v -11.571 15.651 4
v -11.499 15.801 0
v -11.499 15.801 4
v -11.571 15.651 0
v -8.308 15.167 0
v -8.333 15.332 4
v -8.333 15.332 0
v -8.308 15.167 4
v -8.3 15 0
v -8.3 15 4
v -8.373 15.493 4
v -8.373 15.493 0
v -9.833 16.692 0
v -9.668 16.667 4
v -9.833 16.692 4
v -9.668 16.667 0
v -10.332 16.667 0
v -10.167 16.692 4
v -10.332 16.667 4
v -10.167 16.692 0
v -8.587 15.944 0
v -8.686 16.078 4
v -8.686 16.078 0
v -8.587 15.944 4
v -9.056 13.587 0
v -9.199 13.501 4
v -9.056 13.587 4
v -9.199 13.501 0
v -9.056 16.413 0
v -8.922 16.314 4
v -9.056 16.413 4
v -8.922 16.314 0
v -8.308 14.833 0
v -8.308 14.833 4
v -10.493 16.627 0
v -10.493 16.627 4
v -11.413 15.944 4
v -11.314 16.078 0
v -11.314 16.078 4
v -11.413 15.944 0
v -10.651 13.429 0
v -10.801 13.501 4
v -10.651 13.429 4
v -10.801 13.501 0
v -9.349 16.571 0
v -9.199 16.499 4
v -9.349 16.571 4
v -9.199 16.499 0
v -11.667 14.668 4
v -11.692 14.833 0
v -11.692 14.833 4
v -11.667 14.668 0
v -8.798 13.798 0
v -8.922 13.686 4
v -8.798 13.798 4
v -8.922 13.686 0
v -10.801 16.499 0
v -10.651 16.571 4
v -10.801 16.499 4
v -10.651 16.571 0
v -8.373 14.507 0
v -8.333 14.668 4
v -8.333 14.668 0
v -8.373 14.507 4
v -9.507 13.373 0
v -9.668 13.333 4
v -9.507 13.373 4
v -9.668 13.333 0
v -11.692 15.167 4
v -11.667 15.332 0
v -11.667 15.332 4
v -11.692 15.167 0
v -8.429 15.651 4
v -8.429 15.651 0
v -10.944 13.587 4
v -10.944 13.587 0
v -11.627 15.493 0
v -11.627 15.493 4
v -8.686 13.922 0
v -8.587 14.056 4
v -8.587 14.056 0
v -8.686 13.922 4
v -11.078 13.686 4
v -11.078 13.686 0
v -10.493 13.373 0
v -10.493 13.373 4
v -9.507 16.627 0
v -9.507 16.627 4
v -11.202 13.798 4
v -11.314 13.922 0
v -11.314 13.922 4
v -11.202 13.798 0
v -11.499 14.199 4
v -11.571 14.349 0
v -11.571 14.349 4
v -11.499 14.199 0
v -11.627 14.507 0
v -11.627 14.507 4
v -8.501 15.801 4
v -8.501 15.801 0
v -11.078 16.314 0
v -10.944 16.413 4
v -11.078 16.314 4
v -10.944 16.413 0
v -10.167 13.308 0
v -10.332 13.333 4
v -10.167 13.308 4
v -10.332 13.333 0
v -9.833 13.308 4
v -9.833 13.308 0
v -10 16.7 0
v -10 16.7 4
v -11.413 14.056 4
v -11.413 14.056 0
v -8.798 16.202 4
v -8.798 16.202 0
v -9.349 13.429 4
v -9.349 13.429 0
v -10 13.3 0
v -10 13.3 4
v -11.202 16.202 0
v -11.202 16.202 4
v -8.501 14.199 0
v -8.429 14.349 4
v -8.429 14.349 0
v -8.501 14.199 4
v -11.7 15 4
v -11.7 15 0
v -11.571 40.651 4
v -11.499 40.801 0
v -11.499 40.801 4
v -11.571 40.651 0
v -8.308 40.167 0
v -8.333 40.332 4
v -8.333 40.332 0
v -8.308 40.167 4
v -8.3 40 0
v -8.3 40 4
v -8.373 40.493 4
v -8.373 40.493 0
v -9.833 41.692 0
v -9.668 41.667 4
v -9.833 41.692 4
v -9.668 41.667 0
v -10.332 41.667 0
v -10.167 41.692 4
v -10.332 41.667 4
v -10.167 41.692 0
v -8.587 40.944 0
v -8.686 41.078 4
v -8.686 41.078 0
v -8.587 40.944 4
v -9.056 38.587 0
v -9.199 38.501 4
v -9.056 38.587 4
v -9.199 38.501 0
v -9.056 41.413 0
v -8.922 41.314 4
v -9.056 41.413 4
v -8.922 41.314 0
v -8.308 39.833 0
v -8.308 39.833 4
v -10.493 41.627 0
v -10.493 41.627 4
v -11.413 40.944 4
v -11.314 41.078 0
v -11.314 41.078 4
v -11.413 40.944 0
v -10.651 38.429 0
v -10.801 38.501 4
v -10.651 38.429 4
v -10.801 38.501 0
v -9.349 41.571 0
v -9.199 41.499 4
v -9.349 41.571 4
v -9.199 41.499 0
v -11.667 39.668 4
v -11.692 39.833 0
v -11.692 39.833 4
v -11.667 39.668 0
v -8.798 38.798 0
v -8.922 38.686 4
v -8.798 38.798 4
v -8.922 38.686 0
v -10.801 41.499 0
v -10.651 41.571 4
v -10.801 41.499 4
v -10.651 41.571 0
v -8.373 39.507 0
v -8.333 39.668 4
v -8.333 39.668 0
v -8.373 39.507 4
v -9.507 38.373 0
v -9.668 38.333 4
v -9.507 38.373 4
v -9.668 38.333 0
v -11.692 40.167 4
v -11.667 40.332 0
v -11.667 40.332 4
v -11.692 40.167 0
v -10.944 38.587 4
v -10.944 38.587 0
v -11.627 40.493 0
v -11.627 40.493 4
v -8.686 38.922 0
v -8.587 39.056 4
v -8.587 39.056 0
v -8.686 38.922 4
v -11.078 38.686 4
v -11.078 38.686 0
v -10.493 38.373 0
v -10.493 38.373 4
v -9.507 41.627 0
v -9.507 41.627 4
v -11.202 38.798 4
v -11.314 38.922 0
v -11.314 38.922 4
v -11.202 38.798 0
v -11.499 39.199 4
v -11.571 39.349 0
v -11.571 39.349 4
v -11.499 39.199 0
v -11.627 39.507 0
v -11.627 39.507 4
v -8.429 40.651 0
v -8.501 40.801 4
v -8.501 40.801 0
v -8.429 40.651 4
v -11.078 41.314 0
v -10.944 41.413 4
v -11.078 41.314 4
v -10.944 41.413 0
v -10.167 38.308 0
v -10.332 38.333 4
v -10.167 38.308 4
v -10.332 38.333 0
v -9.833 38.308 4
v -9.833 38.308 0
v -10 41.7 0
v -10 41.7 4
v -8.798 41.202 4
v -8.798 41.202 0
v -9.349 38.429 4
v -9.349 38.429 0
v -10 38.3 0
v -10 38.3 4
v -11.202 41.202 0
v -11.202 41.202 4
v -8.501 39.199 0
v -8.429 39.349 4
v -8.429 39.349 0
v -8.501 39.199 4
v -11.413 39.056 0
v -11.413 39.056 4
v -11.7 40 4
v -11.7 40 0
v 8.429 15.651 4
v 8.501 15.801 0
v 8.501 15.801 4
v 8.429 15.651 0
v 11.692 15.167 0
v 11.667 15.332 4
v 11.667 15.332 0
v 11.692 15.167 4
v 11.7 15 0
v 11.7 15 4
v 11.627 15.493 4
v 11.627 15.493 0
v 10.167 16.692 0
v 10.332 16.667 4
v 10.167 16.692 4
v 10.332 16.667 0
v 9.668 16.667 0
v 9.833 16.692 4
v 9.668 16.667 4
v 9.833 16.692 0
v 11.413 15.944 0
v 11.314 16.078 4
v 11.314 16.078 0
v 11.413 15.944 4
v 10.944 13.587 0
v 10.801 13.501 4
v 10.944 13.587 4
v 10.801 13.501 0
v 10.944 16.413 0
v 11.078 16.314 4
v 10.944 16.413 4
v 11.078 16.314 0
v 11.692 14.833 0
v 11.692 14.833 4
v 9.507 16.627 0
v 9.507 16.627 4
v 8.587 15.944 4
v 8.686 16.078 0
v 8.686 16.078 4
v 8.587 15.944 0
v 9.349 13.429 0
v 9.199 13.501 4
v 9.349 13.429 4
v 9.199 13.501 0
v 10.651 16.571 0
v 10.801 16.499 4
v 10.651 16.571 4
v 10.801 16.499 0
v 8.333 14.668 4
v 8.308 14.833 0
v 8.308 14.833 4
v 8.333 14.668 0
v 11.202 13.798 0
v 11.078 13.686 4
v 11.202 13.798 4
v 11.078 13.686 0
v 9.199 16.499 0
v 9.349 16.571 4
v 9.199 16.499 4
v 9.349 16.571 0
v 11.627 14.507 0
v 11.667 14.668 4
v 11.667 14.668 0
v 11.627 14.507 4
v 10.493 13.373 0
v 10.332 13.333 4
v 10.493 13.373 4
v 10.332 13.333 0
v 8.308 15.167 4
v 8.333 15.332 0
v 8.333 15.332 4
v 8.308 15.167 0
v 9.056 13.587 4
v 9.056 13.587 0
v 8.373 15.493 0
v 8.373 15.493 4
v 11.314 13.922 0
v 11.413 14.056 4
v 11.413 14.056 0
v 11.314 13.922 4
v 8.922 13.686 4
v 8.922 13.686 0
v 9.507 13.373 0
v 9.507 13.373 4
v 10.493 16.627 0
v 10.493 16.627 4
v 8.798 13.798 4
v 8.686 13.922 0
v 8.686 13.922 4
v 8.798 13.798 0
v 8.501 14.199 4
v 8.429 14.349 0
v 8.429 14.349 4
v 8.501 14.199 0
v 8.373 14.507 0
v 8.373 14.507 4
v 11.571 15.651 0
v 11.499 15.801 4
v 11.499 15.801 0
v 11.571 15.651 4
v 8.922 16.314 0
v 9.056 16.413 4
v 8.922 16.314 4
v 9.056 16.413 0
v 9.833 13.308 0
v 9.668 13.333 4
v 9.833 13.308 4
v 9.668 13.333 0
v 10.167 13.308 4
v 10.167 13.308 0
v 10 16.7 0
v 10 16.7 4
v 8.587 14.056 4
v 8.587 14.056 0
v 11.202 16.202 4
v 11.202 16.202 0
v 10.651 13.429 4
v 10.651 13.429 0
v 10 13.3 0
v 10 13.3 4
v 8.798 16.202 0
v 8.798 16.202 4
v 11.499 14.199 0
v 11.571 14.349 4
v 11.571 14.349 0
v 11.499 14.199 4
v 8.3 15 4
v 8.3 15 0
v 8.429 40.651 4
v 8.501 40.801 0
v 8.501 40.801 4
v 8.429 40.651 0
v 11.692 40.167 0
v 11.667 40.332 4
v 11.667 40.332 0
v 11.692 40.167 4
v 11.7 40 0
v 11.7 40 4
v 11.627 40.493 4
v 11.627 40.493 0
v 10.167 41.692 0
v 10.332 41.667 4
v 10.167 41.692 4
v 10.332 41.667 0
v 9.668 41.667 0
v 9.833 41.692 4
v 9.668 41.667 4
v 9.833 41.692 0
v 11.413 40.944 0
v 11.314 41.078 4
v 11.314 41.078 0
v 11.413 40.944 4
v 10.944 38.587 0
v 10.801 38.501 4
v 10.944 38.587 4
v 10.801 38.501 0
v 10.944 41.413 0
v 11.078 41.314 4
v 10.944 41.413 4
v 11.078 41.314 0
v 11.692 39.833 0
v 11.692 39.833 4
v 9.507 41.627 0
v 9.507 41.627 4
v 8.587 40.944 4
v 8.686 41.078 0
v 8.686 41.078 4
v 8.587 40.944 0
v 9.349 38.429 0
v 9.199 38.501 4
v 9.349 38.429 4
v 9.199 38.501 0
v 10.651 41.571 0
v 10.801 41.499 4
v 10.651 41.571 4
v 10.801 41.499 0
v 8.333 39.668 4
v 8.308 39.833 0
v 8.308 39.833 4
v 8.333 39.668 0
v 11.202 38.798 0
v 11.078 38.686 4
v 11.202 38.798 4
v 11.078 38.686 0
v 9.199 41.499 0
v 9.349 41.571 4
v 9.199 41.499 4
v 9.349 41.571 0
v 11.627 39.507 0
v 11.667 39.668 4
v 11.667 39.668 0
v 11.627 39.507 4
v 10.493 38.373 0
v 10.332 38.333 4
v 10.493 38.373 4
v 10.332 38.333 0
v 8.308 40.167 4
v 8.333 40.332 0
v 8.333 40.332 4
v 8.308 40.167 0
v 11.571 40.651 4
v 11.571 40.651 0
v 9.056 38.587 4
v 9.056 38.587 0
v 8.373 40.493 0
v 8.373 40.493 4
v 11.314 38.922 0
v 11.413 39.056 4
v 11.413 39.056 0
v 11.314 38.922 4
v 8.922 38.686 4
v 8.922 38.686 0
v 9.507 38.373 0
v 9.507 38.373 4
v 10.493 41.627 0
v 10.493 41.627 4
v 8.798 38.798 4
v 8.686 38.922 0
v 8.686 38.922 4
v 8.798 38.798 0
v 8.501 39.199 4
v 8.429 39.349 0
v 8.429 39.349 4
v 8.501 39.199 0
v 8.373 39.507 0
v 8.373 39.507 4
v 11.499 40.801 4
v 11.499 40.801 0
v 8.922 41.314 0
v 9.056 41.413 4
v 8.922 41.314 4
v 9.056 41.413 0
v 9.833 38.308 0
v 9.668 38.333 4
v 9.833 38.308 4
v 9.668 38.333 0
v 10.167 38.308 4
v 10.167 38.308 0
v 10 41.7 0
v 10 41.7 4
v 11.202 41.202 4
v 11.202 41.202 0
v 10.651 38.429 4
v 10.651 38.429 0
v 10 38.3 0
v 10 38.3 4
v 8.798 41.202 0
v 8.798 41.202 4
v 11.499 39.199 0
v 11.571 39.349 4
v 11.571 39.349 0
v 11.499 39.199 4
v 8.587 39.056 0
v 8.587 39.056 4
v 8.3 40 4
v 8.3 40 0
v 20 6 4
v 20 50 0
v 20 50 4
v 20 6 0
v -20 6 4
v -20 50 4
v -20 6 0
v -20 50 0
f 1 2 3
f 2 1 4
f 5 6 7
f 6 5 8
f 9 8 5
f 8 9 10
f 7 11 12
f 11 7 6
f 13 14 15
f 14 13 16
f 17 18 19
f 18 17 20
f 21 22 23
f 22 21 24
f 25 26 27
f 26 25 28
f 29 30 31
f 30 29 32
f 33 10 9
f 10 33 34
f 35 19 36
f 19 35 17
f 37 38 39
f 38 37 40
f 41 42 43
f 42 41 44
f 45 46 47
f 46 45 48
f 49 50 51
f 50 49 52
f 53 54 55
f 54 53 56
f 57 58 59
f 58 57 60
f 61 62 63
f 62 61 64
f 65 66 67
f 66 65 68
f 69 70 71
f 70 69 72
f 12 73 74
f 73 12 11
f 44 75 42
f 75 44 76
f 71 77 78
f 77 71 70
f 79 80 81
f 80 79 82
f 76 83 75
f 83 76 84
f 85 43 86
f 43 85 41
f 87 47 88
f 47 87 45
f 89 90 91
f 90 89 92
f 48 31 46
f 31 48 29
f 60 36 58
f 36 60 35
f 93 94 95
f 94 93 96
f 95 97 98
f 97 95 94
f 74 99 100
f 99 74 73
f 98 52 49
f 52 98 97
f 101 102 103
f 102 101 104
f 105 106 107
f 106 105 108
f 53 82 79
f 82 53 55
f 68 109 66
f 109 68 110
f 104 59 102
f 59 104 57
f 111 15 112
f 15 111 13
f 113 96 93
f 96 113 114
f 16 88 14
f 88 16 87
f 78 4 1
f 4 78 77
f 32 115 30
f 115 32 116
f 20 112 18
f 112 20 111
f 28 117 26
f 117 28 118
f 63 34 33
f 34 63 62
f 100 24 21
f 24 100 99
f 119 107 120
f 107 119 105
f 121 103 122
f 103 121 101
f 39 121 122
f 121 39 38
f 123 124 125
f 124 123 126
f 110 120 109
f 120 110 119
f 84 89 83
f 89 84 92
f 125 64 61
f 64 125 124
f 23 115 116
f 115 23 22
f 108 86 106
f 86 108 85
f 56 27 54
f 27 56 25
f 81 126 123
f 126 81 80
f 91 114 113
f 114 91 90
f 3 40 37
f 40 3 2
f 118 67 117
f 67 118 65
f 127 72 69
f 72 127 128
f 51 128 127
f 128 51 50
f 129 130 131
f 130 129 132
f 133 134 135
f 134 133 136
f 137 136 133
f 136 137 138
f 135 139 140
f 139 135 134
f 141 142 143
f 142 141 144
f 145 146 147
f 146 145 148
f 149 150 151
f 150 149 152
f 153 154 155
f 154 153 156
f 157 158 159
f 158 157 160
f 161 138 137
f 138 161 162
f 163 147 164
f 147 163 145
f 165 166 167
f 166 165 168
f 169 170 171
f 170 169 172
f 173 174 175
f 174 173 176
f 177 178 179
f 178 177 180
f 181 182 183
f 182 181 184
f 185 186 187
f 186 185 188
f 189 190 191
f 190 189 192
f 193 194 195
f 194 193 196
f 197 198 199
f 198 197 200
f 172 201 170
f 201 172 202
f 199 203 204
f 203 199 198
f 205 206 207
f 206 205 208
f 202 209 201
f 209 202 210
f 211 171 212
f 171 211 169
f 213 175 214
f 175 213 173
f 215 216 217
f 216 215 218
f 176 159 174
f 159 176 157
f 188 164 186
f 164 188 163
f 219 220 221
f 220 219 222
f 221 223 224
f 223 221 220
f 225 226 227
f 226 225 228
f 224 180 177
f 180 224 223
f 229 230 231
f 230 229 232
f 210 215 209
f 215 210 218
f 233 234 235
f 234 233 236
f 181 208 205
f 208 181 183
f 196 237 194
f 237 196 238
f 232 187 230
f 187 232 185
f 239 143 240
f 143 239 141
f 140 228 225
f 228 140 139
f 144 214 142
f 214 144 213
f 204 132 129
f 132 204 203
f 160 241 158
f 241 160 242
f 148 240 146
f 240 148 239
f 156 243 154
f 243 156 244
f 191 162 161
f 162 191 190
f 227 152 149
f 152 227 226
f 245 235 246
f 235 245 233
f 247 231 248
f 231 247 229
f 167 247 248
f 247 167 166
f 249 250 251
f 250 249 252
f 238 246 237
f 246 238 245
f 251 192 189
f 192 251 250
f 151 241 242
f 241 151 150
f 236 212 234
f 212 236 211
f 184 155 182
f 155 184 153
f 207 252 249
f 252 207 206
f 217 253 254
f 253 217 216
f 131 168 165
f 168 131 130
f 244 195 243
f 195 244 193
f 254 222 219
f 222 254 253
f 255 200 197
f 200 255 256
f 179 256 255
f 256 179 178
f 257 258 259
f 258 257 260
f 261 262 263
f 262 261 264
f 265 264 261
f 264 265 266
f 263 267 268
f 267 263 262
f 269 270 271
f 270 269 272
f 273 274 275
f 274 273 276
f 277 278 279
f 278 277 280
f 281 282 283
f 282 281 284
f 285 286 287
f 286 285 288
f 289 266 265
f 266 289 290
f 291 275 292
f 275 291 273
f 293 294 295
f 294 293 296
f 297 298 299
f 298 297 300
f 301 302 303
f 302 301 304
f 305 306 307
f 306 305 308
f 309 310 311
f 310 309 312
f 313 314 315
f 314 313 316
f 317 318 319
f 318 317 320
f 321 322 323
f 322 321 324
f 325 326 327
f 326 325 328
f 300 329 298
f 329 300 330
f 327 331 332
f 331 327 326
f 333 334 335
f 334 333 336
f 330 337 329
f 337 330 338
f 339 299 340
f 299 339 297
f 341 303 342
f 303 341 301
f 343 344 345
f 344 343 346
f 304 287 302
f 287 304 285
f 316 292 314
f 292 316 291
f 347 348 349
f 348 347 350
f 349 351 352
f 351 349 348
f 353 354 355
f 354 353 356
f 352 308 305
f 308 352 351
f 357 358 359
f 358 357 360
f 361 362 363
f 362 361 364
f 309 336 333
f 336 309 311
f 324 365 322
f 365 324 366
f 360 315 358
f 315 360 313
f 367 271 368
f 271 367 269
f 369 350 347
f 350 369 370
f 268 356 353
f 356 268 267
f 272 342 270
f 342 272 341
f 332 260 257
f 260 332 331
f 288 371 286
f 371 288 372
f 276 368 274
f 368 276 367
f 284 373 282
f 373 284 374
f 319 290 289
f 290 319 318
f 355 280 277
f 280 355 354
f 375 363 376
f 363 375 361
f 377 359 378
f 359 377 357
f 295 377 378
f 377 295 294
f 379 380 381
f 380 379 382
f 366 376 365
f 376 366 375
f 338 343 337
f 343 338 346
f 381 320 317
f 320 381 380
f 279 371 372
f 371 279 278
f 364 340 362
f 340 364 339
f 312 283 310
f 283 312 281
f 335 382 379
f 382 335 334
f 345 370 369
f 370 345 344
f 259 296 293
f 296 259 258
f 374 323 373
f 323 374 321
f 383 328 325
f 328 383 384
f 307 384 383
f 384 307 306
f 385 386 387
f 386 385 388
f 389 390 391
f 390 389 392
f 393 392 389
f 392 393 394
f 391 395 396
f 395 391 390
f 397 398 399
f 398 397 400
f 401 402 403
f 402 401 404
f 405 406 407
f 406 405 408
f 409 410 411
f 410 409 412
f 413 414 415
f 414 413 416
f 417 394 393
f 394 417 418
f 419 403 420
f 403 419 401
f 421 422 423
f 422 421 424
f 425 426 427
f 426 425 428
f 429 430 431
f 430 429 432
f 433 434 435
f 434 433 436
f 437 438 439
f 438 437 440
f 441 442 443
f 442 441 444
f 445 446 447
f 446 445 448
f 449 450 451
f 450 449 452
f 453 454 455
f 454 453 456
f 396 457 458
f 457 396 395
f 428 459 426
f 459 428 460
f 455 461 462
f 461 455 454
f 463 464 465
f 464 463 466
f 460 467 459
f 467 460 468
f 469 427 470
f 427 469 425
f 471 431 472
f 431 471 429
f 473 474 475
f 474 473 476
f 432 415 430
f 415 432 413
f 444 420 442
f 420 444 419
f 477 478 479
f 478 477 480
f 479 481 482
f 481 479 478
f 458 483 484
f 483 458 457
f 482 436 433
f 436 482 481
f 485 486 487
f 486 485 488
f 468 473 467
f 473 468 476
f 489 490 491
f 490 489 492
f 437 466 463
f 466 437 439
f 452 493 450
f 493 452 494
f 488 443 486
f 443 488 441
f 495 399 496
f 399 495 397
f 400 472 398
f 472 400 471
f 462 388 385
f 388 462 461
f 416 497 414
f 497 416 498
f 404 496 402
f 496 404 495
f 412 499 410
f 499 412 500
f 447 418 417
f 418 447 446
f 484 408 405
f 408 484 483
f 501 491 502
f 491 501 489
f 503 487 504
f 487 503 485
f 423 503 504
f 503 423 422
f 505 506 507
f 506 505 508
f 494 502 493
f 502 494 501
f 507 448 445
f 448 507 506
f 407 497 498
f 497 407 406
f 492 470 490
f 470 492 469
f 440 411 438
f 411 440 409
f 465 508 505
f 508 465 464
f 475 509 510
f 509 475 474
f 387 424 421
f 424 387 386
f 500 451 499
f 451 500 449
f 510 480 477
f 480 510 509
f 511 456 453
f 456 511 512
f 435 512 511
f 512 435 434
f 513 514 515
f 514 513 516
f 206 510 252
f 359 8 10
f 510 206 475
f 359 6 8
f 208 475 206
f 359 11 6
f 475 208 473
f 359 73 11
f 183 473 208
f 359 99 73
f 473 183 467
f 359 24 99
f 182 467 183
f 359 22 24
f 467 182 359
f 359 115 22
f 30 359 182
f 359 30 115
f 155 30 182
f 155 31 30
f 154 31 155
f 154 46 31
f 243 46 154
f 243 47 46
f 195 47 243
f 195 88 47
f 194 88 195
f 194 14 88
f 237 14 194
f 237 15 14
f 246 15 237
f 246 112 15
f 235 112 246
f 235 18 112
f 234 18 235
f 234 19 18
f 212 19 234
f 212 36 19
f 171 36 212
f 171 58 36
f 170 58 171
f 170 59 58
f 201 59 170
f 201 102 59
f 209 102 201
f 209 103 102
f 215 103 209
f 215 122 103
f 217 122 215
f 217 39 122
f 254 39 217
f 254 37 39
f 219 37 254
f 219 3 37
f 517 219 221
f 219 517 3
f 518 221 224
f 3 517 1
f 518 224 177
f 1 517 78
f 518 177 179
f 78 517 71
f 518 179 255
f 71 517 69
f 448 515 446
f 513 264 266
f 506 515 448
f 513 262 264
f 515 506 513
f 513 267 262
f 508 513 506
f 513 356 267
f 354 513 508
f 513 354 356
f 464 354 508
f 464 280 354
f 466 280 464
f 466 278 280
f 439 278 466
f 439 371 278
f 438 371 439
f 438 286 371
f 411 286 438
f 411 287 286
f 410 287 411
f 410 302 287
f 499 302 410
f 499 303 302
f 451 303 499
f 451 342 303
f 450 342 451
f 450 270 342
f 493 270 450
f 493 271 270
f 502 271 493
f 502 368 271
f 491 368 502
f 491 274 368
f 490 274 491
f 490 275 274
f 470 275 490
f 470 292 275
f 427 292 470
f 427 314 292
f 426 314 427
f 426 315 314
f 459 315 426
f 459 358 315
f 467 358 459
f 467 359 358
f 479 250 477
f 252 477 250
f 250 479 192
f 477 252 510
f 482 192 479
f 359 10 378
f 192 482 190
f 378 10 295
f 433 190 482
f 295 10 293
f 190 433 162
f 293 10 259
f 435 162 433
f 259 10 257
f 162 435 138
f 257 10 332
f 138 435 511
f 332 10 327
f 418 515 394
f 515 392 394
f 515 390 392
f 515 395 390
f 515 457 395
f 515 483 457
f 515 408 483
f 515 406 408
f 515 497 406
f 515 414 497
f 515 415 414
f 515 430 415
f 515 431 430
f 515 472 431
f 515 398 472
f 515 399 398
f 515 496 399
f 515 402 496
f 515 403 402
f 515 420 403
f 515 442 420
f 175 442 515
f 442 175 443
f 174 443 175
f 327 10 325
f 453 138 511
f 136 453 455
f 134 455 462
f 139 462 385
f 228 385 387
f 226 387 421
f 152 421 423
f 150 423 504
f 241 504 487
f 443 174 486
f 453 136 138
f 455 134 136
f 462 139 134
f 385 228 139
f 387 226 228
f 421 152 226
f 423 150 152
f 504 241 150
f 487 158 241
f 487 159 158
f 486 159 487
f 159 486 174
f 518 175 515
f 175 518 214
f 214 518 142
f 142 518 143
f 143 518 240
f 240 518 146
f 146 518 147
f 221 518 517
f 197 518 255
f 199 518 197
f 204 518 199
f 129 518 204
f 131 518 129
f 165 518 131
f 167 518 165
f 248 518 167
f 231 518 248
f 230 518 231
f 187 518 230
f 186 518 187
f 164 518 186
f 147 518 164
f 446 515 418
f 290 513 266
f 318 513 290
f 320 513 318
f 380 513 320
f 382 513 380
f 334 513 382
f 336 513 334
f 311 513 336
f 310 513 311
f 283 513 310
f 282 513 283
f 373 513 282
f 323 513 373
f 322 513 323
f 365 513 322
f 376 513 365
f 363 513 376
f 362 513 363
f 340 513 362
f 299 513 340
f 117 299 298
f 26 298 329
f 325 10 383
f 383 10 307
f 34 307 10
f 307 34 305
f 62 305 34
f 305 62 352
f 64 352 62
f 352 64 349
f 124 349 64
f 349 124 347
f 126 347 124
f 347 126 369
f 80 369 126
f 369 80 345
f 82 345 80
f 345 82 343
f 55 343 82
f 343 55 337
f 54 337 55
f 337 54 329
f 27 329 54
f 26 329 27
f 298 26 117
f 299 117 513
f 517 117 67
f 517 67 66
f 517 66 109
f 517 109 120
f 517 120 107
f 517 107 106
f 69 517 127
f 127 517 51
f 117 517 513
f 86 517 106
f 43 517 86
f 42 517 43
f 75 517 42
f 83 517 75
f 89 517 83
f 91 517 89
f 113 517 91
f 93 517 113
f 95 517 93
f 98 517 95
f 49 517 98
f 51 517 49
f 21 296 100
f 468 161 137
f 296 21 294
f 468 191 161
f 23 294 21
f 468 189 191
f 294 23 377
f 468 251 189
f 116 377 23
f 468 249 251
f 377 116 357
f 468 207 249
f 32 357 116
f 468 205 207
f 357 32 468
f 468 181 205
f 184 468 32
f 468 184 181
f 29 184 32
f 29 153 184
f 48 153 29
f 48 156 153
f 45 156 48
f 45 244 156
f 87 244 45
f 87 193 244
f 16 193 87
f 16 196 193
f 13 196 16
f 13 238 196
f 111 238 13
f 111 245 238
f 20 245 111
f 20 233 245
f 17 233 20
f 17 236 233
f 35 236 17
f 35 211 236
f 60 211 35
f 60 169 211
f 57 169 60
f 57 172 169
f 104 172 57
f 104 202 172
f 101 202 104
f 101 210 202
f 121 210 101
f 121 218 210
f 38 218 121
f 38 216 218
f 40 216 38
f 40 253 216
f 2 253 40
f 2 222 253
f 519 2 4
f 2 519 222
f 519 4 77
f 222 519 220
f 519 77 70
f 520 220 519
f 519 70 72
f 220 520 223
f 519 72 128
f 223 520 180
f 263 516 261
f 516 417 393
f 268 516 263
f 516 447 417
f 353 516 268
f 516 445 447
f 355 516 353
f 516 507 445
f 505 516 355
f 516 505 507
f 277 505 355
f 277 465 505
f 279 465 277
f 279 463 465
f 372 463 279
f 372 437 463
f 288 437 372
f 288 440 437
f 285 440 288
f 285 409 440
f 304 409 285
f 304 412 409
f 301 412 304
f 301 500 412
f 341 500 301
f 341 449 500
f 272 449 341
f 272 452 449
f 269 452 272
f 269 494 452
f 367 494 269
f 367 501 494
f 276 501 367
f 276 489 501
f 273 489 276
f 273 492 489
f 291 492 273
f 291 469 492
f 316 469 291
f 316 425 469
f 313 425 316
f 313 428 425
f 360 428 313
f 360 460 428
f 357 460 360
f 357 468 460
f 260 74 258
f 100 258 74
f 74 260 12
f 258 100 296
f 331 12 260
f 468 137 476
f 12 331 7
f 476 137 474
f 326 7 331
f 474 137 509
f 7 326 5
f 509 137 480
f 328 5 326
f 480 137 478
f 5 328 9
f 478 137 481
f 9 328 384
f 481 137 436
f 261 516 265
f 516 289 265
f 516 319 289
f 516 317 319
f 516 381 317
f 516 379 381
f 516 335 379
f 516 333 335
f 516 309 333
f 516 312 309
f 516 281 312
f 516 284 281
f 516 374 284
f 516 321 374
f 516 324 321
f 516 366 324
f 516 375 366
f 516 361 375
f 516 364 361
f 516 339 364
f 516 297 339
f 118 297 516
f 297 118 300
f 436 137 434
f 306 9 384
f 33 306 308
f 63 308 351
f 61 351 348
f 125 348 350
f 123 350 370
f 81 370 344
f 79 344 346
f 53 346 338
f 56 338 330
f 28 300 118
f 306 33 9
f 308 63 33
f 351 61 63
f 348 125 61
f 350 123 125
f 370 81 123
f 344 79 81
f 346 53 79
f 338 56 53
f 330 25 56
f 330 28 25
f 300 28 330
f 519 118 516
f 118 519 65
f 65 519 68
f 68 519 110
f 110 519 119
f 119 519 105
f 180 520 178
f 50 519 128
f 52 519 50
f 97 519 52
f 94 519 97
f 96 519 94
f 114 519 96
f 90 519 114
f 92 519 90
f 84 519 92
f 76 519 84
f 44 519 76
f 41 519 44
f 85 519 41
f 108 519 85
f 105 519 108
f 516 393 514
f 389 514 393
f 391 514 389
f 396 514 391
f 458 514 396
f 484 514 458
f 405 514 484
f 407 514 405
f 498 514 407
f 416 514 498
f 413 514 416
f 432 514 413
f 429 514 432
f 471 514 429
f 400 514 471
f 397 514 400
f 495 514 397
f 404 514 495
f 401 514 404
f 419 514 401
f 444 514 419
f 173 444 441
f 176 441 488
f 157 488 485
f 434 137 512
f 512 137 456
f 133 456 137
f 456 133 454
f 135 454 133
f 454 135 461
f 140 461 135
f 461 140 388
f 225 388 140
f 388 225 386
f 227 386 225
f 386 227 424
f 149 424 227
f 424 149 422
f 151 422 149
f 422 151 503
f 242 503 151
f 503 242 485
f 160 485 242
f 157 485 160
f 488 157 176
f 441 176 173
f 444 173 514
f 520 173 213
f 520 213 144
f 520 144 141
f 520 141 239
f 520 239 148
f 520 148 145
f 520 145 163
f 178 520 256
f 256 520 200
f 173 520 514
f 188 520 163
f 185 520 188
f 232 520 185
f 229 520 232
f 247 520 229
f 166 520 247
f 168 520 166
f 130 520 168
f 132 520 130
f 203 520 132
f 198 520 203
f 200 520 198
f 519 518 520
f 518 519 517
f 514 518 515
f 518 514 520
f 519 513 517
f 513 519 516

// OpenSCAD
// file: common.scad
// Shared parameters for the openprint-build printable parts.
//
// These are NOT Open Tools' files (unpublished as of Oct 2026). They are
// original, parametric parts built around standard off-the-shelf components.
// Values marked VERIFY are best estimates: measure your part and edit here.
//
// Coordinate frame used by the axis parts:
//   X = carriage travel (along the guide rods)
//   Y = front (+) / back (-)
//   Z = up
// Lower rod axis at y=0,z=0; upper rod at y=0,z=rod_spacing.

$fn = 64;

clr        = 0.3;    // general fit clearance (Prusa CORE One, 0.4 nozzle)

// Guide rods + linear bearings
rod_d       = 8;     // steel guide rod
rod_spacing = 30;    // vertical distance between the two rods
lm_d        = 15;    // LM8UU outer diameter
lm_l        = 24;    // LM8UU length
lm_fit      = 0.15;  // press fit allowance on LM8UU bore

// GT2 belt drive
belt_w      = 6;     // GT2 6 mm belt
belt_t      = 1.4;   // belt thickness incl. teeth
belt_pitch  = 2;
pulley_pr   = 6.37;  // pitch radius of a GT2 20T pulley / idler
belt_y      = -18;   // belt centre plane (behind the rods)
belt_z      = rod_spacing / 2;   // pulley axis height

// NEMA17
nema_w      = 42.3;
nema_holes  = 31;    // hole spacing
nema_boss   = 22.5;  // centring boss clearance
m3          = 3.4;   // M3 clearance
m3_tap      = 2.8;   // M3 self-tap into plastic
m5          = 5.3;
m5_tap      = 4.3;
m4          = 4.4;

// HP 63 / 302 / 803 cartridge body (same shell for black + tri-colour)
// VERIFY: measure with calipers, or print cart_fit_gauge.stl first.
cart_w      = 19.0;  // along X (thin side)
cart_d      = 36.5;  // along Y (front-back, contact pad on the back face)
cart_fit    = 0.6;   // total clearance per dimension

// Teardrop: horizontal hole that prints without supports.
// Axis along X; point faces +Z.
module teardrop_x(d, l) {
    // rotate([0,90,0]) maps 2D -X to 3D +Z, so the point goes at 180°.
    rotate([0, 90, 0])
    linear_extrude(height = l, center = true)
        union() {
            circle(d = d);
            rotate(135) square(d / 2);  // 45° roof
        }
}

// Same, axis along Y.
module teardrop_y(d, l) {
    // rotate([90,0,0]) maps 2D +Y to 3D +Z.
    rotate([90, 0, 0])
    linear_extrude(height = l, center = true)
        union() {
            circle(d = d);
            rotate(45) square(d / 2);
        }
}

// ---------------------------------------------------------------------------
// Machine layout (frame coordinates). Origin: inner face of the left end wall,
// back face of the tray, bottom of the base. X right, Y toward the front, Z up.
// The axis parts above are modelled around their own rod; place them with
// rod_y / rod_z below.

L        = 525;      // inner length between end walls (outer = L + 2*wall)
wall     = 6;        // end wall / tray wall thickness
base_t   = 4;        // tray floor
depth    = 130;      // tray depth (Y)
height   = 105;      // tray height (Z), excluding roll arms

rod_y    = 70;       // both rods in one vertical plane
rod_z    = 50;       // lower rod; upper rod at rod_z + rod_spacing
paper_z  = 37;       // paper plane (top of platen ribs, the nip)
paper_x0 = 94;       // paper zone, 297 mm (A4 width / A3 roll)
paper_x1 = paper_x0 + 297;

pulley_x = 25;       // carriage motor pulley (left)
idler_x  = 445;      // belt idler (right)

feed_y   = 38;       // feed roller shaft (driven, top of the nip)
feed_r   = 12.3;     // TPU sleeve radius, 0.3 interference on the pinch
feed_z   = paper_z + 12;
pinch_z  = paper_z - 11;    // 608 bearings (r = 11) roll on the pinch shaft

pillar_x = [47, 425];       // inboard shaft supports (left edge of each, 8 wide)

roll_y   = 50;       // roll spindle axis
roll_z   = 155;
b608_d   = 22;
b608_w   = 7;

split_x  = [175, 350];      // tray section joints
// main file
// Splice plate for the tray joints (print 4: floor + back wall at each of
// the two joints). Lies inside the tray across the joint, M3 x 12 + nuts.
//
//   -D 'which="floor"' or -D 'which="back"'

include <common.scad>

which = "floor";
w = 40;      // along X, matches splice_w in frame.scad
t = 4;

if (which == "floor")
    difference() {
        translate([-w / 2, 6, 0]) cube([w, 44, t]);
        for (dx = [-w / 4, w / 4], y = [15, 40])
            translate([dx, y, -1]) cylinder(d = m3, h = t + 2);
    }
else
    difference() {
        // printed flat; local Y = height in the tray (clears the floor plate)
        translate([-w / 2, 12, 0]) cube([w, 86, t]);
        for (dx = [-w / 4, w / 4], z = [30, 80])
            translate([dx, z, -1]) cylinder(d = m3, h = t + 2);
    }
